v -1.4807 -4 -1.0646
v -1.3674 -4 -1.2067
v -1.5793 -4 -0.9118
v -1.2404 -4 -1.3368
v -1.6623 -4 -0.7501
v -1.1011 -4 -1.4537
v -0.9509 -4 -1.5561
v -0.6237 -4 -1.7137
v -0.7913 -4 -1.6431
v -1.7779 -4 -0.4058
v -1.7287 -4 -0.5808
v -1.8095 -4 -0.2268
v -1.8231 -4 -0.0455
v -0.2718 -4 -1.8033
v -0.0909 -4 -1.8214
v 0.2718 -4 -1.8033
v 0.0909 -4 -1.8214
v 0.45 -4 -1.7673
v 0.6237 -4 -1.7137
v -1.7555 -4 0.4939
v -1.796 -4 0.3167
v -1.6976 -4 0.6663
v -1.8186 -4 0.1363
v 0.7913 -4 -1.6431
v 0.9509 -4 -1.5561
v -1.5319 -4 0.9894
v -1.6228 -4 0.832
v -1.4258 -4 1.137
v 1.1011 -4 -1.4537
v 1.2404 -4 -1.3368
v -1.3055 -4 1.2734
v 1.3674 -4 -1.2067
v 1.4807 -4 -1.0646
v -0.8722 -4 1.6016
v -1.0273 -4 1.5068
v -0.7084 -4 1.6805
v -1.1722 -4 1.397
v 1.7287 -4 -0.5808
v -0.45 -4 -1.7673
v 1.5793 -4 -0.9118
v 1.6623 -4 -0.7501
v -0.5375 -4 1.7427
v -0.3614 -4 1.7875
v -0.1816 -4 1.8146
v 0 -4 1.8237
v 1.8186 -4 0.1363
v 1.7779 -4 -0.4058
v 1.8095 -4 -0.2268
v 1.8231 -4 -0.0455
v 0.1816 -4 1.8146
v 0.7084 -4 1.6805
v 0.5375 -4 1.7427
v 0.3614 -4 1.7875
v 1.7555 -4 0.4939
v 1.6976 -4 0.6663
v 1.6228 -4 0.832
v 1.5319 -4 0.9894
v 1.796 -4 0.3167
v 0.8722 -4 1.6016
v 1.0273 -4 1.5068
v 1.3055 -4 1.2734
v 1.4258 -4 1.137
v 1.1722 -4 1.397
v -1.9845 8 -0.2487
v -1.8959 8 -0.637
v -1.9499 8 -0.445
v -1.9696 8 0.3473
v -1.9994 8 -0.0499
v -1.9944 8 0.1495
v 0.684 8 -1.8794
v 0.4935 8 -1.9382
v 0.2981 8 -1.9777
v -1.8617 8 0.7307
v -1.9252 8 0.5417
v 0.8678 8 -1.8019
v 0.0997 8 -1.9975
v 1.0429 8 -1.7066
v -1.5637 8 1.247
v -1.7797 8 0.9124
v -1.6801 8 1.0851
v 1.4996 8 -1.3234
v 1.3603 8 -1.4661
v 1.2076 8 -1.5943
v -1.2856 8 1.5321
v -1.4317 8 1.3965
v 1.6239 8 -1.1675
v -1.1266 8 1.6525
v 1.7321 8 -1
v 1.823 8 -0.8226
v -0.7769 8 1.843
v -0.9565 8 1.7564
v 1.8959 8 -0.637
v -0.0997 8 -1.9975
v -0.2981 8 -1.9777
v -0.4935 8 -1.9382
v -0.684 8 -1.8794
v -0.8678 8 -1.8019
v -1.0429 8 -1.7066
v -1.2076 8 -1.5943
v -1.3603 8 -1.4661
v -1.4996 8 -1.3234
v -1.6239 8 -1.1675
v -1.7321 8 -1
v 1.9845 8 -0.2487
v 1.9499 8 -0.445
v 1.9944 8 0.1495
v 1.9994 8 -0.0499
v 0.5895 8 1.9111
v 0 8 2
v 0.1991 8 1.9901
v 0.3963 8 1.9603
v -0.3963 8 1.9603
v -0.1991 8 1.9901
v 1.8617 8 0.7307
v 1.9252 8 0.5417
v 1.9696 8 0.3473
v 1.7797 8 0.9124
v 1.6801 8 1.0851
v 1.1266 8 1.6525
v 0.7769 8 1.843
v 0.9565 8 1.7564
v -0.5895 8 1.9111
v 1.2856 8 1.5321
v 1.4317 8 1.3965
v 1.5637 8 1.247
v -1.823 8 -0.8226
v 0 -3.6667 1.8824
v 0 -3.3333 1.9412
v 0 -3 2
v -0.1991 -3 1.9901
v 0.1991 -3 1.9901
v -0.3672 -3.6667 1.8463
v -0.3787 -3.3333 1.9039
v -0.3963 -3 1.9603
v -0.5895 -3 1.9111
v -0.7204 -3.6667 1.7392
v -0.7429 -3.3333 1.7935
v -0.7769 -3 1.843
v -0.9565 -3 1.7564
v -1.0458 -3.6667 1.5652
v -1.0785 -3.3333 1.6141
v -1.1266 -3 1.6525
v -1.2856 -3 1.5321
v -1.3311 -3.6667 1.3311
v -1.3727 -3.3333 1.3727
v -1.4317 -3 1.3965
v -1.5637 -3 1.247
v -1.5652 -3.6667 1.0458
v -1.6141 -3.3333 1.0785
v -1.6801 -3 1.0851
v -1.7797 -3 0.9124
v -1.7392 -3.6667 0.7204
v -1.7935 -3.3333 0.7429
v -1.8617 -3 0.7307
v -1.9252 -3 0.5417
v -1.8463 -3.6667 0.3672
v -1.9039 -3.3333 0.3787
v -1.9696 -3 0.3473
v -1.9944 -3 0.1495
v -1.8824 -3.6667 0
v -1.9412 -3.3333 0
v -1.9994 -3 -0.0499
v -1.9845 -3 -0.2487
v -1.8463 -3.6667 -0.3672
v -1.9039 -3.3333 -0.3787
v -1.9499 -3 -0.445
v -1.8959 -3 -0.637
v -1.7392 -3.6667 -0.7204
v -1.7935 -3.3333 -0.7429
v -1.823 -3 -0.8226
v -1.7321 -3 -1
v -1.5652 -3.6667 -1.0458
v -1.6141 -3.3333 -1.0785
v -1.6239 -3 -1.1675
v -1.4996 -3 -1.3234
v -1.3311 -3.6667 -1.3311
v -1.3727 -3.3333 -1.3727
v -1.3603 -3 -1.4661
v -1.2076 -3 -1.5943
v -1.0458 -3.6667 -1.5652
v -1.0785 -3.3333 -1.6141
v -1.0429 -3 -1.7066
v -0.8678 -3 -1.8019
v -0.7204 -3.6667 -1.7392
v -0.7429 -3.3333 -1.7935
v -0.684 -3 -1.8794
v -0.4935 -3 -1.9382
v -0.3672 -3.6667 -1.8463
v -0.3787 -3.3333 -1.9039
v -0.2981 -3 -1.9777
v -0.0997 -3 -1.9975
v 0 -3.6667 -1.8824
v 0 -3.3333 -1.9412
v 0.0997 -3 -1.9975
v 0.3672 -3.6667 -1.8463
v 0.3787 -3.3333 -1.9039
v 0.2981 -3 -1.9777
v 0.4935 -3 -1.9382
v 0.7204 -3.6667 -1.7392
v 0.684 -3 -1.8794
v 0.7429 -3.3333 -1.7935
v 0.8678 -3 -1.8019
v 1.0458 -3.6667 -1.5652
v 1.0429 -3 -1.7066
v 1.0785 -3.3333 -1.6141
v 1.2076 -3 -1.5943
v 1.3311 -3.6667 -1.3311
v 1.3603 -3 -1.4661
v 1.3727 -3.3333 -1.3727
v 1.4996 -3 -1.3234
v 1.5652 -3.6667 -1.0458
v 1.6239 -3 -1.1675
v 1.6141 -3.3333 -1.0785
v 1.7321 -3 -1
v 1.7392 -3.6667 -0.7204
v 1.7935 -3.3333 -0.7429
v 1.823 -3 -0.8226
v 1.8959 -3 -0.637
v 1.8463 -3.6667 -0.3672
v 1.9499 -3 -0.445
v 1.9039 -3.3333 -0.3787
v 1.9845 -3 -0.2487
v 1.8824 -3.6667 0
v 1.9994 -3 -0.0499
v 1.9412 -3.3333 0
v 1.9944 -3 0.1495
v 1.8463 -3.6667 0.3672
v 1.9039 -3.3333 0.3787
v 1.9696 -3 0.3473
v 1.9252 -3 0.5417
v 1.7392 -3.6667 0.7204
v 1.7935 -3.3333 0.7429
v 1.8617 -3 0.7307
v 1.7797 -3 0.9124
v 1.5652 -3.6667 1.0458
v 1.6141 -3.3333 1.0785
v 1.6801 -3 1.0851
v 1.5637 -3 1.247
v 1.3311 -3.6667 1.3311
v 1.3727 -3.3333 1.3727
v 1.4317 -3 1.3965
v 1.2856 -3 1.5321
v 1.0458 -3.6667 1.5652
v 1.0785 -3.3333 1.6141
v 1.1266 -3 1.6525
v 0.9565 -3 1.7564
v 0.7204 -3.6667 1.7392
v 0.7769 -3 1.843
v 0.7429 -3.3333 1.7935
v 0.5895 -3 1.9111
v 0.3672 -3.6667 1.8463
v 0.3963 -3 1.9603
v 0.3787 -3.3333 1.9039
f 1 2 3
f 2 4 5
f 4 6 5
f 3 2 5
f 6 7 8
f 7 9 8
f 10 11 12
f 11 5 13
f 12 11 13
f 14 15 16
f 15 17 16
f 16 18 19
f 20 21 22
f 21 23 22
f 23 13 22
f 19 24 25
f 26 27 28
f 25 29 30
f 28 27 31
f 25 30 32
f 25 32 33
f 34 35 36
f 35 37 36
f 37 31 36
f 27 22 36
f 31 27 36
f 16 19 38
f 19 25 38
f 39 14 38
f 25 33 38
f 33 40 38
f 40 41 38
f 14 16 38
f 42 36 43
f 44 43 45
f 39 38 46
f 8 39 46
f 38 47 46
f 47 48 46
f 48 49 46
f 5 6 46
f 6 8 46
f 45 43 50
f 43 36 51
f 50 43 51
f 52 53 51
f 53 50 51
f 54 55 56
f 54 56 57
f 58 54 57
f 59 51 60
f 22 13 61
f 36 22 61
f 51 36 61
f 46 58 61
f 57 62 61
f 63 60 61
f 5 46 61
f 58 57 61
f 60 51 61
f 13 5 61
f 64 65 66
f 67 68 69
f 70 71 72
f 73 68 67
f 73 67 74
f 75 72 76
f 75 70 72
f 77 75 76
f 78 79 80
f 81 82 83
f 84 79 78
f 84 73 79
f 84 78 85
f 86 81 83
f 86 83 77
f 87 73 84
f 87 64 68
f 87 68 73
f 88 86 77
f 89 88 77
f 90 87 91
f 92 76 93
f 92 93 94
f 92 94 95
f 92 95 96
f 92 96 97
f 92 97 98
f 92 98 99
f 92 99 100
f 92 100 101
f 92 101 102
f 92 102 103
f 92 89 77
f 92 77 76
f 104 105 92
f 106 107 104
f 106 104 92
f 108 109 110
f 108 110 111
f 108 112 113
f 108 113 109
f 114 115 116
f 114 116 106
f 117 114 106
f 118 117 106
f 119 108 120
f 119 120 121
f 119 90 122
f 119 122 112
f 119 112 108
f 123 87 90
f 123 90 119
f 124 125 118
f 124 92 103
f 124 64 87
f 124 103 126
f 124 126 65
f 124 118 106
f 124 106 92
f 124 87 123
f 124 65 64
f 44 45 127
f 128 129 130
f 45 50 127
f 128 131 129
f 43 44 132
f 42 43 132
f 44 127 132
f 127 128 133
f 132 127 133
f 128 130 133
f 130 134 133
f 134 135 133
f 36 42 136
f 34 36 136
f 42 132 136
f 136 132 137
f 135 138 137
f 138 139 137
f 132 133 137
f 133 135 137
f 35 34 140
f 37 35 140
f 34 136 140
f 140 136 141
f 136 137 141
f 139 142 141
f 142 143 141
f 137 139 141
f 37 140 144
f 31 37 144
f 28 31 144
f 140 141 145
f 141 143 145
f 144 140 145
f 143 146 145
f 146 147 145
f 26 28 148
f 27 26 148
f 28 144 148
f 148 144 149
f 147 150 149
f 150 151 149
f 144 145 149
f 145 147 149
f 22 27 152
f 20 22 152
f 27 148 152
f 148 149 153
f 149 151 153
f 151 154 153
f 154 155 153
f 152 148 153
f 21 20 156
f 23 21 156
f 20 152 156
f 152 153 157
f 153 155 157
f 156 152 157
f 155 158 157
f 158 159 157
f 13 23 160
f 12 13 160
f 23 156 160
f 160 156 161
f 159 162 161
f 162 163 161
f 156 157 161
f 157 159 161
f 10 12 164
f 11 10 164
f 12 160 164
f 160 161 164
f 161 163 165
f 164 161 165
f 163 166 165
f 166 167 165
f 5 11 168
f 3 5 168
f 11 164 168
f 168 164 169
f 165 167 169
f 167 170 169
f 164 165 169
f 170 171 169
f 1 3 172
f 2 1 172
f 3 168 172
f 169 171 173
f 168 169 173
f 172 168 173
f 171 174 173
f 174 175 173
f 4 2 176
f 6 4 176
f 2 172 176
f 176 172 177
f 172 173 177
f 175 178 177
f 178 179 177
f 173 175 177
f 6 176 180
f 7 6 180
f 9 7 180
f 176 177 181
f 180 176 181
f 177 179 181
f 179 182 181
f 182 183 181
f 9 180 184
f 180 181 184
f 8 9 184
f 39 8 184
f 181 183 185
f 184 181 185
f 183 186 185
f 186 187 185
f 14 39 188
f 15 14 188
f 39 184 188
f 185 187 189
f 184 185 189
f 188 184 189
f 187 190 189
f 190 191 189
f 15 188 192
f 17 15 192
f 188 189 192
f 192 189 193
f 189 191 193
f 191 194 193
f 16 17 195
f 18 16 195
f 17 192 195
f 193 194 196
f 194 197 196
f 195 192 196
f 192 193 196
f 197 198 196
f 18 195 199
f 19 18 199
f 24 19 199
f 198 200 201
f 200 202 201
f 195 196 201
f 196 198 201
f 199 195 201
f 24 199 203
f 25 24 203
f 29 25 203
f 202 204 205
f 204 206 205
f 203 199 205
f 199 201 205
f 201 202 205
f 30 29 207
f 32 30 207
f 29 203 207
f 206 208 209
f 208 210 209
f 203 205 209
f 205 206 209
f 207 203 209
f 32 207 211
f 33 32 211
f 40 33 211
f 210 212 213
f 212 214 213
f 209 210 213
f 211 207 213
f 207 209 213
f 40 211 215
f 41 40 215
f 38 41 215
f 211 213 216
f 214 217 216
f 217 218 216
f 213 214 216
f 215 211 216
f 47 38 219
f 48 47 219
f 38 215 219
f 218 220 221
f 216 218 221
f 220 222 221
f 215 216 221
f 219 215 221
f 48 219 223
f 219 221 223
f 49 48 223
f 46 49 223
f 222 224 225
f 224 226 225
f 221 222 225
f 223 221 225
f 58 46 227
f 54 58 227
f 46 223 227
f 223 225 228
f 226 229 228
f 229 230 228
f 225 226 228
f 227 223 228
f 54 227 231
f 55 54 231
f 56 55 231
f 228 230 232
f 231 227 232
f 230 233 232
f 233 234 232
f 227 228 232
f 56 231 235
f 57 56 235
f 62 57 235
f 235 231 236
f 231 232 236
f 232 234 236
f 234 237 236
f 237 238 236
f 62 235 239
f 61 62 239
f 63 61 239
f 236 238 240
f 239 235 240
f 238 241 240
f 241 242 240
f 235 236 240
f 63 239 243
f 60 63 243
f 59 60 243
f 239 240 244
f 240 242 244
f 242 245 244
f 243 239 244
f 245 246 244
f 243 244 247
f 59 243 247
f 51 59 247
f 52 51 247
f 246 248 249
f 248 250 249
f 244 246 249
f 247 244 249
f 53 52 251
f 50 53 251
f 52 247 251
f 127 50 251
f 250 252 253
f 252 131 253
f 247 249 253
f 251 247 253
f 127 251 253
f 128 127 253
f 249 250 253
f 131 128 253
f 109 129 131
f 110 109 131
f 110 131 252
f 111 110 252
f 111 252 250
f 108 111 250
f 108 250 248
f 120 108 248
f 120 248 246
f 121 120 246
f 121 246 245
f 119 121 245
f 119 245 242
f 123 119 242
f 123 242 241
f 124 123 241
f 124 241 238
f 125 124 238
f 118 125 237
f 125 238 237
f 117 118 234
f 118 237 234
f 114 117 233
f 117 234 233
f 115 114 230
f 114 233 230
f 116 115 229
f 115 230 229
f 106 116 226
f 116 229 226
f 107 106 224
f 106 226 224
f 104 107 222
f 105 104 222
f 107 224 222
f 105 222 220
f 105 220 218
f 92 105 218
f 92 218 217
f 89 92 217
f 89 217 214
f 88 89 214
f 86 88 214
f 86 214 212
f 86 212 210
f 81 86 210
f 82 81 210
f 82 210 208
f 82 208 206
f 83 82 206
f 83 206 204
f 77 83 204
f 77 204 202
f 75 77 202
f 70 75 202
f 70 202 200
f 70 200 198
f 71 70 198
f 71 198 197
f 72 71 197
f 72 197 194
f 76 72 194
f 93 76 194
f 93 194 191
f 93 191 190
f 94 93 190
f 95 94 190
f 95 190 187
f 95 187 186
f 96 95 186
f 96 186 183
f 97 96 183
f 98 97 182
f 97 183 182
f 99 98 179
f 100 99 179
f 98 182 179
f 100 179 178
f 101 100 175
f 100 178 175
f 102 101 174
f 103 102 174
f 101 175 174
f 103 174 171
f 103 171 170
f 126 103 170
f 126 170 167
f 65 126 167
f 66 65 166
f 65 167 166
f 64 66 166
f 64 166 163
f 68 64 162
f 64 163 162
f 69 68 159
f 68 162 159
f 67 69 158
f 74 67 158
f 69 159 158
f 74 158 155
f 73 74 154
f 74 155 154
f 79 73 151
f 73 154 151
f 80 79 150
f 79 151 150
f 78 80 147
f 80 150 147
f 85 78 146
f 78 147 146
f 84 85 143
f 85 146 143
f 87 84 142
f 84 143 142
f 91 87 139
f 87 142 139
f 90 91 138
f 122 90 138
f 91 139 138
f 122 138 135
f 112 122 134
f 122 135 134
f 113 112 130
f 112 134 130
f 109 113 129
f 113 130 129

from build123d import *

# Parameters (mm, degrees)
SKETCH_1_R      = 2
EXTRUDE_1_DEPTH = 8
EXTRUDE_START   = -12
SKETCH_3_R      = 2
EXTRUDE_2_DEPTH = 12


with BuildPart() as part:
    # ｽｹｯﾁ1 → ﾎﾞｽ - 押し出し1 (new body)
    with BuildSketch(Plane(origin=(0, 0, 0), x_dir=(1, 0, 0), z_dir=(0, 1, 0))):
        with Locations(Location((0, 0, 0), (0, 0, 270))):
            Circle(SKETCH_1_R)
    extrude(amount=EXTRUDE_1_DEPTH)

    # ｽｹｯﾁ3 → ﾎﾞｽ - 押し出し2 (add)
    with BuildSketch(Plane(origin=(0, 8, 0), x_dir=(1, 0, 0), z_dir=(0, 1, 0)).offset(EXTRUDE_START)):
        with Locations(Location((0, 0, 0), (0, 0, 270))):
            Circle(SKETCH_3_R)
    extrude(amount=EXTRUDE_2_DEPTH)

    # ｽｹｯﾁ4 → ｶｯﾄ - 回転1 (revolve, cut)
    with BuildSketch(Plane(origin=(0, 0, 0), x_dir=(0, 0, -1), z_dir=(1, 0, 0)), mode=Mode.PRIVATE) as cut_revolve_1_sk:
        Polygon((1.823673019, -4), (2, -3), (2, -4), align=None)
    revolve(cut_revolve_1_sk.sketch.rotate(Axis((0, 0, 0), (0, -1, 0)), 180), axis=Axis((0, 0, 0), (0, -1, 0)), mode=Mode.SUBTRACT)


solid = part.part
